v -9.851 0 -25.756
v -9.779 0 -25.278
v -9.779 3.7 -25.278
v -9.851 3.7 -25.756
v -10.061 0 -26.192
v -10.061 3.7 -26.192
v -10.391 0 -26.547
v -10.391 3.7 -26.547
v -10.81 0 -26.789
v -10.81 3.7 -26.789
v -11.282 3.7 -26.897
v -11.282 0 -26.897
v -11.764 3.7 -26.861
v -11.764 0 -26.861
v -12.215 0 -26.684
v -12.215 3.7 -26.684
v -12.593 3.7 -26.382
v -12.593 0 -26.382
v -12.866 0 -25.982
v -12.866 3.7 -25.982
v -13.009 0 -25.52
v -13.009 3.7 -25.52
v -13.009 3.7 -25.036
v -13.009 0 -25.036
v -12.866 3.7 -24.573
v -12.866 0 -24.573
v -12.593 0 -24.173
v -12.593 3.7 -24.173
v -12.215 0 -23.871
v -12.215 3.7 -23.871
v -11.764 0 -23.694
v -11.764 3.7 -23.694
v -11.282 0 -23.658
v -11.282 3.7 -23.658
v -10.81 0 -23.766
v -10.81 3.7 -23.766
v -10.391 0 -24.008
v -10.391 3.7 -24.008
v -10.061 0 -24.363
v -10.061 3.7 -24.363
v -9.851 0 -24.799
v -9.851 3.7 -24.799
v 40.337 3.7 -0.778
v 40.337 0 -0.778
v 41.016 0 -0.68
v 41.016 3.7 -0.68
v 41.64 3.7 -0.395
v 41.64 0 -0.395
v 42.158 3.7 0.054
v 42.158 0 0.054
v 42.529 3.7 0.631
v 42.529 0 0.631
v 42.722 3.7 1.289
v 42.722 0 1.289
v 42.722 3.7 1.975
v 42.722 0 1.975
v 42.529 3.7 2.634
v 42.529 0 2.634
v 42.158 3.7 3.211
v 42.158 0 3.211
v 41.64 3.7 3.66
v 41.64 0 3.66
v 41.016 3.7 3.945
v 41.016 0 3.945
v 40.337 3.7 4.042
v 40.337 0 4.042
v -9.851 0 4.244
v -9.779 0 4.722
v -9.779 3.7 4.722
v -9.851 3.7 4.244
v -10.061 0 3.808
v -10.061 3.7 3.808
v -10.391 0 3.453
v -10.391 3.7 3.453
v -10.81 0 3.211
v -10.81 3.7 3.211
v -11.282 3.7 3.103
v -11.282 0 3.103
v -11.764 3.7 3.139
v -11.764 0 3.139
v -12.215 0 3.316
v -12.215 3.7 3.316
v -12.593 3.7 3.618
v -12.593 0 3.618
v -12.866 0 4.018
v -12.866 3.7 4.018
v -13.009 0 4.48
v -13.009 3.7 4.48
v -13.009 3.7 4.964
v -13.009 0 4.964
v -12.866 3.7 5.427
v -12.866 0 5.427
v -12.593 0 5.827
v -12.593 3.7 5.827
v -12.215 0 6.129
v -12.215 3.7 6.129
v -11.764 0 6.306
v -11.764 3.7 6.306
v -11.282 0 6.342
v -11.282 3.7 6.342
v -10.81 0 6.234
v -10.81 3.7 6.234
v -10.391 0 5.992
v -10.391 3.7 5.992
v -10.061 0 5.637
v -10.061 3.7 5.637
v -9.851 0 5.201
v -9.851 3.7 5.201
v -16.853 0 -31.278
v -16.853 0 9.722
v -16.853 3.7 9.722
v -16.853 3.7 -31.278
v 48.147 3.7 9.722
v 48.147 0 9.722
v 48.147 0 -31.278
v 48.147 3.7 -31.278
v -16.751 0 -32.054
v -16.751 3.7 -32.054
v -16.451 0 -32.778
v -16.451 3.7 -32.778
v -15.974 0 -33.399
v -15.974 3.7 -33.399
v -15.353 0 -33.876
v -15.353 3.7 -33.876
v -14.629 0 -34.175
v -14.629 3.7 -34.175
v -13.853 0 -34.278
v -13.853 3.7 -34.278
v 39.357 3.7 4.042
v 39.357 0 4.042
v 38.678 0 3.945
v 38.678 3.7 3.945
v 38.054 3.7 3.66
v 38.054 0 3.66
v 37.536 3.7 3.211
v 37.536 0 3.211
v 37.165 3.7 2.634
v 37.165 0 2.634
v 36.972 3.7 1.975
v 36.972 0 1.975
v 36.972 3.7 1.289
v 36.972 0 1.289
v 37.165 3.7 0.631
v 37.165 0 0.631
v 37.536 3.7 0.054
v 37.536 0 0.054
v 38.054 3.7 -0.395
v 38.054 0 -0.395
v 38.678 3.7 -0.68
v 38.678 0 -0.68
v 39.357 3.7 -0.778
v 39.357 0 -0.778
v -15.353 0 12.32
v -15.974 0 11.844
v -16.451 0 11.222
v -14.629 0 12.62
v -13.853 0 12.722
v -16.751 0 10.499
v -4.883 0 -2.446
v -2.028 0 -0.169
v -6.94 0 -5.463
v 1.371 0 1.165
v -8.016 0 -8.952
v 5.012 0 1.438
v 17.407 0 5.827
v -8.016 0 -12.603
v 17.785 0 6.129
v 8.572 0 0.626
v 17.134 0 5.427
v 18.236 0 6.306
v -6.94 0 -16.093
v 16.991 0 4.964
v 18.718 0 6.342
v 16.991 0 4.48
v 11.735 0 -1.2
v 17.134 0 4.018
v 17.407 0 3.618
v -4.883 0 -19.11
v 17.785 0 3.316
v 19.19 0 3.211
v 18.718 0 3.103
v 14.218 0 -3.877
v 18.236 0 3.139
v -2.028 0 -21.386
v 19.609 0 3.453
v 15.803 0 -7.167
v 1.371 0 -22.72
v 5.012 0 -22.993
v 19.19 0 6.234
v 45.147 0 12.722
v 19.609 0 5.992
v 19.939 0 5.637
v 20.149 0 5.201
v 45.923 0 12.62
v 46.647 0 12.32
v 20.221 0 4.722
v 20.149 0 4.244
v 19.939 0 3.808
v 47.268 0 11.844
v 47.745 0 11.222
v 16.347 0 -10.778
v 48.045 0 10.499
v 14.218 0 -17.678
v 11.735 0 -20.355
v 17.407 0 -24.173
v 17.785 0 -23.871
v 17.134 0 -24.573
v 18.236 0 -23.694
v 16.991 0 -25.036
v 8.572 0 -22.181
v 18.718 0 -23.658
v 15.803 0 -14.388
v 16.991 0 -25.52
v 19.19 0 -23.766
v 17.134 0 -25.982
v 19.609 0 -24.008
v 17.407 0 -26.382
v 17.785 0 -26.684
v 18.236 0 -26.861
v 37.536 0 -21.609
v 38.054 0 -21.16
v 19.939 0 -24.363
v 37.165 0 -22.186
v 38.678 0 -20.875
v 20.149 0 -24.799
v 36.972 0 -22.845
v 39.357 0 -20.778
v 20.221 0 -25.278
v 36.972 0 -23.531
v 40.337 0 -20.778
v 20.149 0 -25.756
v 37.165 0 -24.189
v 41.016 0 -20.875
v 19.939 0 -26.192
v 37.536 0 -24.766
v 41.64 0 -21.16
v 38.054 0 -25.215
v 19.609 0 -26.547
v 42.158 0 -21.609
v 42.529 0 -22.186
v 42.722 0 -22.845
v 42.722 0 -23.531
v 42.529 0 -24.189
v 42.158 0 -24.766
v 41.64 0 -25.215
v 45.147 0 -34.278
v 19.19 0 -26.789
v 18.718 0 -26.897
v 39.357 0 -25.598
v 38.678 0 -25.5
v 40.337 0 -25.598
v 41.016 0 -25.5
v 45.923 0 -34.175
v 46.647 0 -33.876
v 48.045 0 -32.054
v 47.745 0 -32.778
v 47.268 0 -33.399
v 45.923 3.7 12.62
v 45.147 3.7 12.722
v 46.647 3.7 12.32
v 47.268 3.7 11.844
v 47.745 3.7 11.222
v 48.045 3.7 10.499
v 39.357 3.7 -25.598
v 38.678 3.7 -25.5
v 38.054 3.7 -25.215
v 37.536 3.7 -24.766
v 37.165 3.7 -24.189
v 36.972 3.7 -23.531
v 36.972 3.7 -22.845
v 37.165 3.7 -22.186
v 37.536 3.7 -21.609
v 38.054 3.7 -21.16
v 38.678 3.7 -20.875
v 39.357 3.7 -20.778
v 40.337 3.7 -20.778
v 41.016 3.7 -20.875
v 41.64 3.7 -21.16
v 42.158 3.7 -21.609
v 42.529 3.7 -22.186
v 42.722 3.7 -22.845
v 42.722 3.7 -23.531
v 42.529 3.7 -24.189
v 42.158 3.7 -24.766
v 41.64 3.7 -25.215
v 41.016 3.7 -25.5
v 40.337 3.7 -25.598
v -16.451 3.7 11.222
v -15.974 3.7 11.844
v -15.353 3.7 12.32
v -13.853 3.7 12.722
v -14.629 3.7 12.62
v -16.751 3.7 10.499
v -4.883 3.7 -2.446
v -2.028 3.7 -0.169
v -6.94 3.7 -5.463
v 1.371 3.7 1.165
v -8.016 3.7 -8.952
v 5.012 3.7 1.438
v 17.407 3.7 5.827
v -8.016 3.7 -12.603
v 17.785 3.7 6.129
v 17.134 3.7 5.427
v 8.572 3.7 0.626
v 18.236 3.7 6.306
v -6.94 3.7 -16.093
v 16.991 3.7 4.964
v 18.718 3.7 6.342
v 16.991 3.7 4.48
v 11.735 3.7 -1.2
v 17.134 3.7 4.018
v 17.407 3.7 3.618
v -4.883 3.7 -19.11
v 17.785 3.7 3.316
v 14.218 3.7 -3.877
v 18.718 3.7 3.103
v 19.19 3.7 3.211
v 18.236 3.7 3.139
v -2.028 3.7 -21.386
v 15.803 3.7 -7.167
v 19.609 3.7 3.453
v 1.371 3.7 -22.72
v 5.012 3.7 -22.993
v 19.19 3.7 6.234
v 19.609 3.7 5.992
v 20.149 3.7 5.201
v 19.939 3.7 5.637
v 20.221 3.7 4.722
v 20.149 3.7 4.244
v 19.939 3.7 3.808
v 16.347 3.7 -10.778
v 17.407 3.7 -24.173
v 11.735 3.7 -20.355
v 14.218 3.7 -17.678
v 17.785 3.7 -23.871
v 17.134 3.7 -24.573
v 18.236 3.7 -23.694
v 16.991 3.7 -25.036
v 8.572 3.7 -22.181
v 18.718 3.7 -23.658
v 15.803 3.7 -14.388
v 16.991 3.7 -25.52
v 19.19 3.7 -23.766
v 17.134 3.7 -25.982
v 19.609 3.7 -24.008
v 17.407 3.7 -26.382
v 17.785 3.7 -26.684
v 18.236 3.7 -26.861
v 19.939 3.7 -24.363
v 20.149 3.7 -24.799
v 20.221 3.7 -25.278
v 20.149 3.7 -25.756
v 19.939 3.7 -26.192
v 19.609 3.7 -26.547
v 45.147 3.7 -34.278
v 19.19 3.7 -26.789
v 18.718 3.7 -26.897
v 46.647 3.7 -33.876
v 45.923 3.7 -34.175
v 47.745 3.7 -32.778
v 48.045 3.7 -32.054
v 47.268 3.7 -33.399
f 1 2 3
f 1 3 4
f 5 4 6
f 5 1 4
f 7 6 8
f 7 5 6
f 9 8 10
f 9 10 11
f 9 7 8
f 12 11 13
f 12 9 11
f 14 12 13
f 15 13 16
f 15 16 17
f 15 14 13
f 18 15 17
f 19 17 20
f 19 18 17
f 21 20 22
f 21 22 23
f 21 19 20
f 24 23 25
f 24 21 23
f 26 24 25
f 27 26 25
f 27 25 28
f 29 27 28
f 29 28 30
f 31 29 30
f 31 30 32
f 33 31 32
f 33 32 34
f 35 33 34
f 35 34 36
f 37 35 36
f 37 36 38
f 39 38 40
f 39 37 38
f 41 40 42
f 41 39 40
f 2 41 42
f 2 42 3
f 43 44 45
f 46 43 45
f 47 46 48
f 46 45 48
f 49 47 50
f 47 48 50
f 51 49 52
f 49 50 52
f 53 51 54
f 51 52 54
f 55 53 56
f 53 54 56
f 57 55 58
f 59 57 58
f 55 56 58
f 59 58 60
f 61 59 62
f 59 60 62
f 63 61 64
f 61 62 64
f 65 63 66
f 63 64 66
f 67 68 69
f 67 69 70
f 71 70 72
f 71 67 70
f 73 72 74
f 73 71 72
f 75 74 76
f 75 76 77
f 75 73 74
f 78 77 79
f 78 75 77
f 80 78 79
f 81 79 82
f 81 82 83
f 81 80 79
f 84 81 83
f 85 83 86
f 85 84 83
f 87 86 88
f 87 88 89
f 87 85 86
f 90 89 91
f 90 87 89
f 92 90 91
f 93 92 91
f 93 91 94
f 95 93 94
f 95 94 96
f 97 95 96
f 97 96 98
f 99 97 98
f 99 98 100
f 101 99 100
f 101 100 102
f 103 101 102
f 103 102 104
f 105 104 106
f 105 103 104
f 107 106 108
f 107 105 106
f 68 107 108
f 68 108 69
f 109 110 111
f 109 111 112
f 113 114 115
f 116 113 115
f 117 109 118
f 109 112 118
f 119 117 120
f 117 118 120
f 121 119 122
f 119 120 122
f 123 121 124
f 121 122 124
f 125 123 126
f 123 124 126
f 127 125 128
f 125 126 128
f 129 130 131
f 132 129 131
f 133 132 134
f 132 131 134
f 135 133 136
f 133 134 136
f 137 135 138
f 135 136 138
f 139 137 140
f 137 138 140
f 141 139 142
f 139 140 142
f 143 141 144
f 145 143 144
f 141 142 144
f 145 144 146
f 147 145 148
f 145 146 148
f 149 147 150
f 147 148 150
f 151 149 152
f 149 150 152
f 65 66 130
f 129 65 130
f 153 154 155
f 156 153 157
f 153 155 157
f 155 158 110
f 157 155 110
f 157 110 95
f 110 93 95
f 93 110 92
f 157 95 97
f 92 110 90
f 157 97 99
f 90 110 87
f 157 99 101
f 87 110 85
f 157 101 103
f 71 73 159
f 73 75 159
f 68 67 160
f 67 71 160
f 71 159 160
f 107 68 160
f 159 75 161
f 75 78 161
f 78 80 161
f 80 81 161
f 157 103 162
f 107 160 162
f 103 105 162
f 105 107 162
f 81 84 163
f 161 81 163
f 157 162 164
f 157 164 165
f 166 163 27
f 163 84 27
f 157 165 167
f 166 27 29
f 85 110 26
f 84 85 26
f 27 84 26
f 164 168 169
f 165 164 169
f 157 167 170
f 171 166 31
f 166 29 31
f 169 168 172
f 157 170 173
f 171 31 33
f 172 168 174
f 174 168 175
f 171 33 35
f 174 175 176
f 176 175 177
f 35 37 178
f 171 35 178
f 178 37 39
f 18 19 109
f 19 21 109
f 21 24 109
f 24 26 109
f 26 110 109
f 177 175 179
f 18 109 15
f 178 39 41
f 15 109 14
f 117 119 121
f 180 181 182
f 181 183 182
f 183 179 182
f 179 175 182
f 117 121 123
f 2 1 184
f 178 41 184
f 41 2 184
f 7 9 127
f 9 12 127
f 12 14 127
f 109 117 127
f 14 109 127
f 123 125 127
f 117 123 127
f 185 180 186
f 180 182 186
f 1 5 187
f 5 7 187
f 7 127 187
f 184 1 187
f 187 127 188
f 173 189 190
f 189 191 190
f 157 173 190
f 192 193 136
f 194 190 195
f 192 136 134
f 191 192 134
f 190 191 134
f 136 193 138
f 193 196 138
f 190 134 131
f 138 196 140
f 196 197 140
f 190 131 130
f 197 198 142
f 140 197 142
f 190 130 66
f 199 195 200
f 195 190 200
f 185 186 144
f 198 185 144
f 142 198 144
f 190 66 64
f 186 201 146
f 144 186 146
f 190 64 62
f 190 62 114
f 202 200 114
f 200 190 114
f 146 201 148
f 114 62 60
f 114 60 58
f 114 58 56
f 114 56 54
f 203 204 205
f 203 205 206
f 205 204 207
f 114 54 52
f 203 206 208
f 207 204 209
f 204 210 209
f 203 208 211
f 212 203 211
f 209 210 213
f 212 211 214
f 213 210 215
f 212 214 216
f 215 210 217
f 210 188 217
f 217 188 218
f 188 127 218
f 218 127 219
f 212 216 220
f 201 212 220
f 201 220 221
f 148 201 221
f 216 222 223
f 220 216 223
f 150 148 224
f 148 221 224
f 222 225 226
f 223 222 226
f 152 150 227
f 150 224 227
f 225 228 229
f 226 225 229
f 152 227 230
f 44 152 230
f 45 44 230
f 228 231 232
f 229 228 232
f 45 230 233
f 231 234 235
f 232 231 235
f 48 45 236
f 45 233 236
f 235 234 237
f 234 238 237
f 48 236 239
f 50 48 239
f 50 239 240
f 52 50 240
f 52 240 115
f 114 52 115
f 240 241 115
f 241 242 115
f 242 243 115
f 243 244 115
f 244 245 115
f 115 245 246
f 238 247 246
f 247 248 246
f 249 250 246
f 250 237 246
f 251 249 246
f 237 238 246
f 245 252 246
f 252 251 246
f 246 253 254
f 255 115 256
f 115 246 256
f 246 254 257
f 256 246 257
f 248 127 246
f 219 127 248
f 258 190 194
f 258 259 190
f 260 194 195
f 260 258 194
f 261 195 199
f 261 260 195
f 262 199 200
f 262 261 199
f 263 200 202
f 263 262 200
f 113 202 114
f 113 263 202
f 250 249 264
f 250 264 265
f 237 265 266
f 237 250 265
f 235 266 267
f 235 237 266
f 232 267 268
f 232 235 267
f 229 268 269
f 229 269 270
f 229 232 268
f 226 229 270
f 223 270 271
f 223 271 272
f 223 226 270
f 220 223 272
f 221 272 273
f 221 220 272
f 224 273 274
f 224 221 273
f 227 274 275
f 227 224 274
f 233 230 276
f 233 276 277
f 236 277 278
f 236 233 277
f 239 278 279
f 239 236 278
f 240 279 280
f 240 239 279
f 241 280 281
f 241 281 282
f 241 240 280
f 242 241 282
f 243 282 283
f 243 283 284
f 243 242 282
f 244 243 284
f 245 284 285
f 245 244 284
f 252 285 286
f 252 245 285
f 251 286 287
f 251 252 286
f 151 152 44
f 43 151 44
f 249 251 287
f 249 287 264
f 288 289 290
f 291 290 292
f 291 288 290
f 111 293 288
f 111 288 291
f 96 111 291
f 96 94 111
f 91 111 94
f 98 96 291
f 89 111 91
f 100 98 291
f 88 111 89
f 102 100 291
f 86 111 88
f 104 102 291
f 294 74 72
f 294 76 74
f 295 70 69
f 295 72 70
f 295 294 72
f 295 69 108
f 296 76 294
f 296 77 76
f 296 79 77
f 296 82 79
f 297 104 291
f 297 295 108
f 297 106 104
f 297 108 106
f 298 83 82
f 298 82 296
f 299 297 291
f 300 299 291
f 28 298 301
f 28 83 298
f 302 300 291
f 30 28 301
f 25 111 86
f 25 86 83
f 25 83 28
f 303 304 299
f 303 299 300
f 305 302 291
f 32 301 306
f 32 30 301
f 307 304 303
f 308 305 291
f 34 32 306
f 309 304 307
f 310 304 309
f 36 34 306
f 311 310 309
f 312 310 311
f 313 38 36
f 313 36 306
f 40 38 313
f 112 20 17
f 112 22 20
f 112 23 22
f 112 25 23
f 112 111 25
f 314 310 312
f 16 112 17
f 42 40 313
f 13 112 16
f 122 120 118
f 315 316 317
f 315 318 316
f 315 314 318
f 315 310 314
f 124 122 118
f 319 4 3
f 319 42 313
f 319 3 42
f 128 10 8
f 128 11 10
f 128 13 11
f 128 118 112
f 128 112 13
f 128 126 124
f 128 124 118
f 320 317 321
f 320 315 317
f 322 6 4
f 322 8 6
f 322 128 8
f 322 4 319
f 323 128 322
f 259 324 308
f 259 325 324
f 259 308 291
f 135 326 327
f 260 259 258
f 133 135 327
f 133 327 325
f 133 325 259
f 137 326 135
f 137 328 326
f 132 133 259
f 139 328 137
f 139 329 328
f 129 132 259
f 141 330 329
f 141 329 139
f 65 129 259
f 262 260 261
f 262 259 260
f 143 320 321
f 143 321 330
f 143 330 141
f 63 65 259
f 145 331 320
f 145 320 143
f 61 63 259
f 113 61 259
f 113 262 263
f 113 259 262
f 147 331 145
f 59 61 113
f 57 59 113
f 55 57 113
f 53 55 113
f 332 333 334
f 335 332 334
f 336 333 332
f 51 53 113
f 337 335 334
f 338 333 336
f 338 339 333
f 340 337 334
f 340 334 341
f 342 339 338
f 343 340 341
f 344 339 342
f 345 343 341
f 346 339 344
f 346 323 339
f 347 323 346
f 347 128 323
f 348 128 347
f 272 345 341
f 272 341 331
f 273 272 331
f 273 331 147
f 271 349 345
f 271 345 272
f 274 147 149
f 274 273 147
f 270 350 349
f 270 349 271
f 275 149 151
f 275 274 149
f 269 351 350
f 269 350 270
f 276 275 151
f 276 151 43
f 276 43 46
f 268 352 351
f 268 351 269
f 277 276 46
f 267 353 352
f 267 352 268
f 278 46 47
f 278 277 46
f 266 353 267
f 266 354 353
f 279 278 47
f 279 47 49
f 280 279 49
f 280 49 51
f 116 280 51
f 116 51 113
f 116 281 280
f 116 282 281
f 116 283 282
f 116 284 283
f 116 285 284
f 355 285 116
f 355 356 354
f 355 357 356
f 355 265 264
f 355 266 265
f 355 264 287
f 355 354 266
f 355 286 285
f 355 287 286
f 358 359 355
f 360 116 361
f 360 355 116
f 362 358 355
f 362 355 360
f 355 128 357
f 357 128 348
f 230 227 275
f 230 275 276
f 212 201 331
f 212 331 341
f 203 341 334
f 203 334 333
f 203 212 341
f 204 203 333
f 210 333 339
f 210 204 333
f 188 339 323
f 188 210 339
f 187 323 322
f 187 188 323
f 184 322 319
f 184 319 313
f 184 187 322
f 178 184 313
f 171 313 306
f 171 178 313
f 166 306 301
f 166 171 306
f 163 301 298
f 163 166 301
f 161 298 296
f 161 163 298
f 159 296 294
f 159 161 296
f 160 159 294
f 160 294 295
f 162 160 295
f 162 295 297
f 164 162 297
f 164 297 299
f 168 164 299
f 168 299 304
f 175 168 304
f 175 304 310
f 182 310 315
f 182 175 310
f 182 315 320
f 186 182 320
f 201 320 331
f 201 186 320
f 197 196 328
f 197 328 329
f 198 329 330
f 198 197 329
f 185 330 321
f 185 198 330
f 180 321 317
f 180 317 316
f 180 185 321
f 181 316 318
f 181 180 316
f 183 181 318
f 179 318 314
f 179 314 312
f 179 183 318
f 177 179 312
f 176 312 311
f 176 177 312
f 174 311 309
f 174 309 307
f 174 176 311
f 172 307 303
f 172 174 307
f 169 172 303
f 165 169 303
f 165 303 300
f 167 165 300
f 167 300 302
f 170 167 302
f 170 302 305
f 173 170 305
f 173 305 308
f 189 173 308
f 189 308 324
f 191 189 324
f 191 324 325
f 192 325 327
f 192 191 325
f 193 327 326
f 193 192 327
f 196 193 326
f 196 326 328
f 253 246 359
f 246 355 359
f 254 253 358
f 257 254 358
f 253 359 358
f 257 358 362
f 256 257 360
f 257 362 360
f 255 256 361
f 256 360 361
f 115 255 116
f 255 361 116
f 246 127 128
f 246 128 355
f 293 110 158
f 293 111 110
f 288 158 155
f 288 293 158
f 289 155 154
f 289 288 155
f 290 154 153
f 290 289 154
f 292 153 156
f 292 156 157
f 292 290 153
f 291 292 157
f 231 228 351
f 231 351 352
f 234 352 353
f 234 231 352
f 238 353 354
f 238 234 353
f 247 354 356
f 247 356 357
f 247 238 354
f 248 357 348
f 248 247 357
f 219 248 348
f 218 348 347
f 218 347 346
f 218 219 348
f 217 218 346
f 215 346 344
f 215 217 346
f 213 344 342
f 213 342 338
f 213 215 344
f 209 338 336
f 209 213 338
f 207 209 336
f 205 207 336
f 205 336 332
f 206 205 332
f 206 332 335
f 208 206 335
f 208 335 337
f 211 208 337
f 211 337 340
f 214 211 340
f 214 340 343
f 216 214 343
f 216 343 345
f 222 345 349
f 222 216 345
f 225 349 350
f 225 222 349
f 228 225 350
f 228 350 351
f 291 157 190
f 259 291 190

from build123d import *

# Parameters (mm, degrees)
SKETCH1_W           = 65
SKETCH1_H           = 47
SKETCH1_R           = 12.25
SKETCH1_R_2         = 1.623849847
BOSS_EXTRUDE1_DEPTH = 3.7
FILLET1_R           = 3


with BuildPart() as part:
    # Sketch1 → Boss-Extrude1 (new body)
    with BuildSketch(Plane(origin=(0, 0, 0), x_dir=(1, 0, 0), z_dir=(0, 1, 0))):
        with Locations((15.646990036, 10.777629745)):
            Rectangle(SKETCH1_W, SKETCH1_H)
        with Locations((4.096990036, 10.777629745)):
            Circle(SKETCH1_R, mode=Mode.SUBTRACT)
        with Locations((-11.403009964, -4.722370255)):
            Circle(SKETCH1_R_2, mode=Mode.SUBTRACT)
        with Locations((18.596990036, -4.722370255)):
            Circle(SKETCH1_R_2, mode=Mode.SUBTRACT)
        with Locations((18.596990036, 25.277629745)):
            Circle(SKETCH1_R_2, mode=Mode.SUBTRACT)
        with Locations((-11.403009964, 25.277629745)):
            Circle(SKETCH1_R_2, mode=Mode.SUBTRACT)
        with BuildLine():
            Line((39.356990036, 0.777629745), (40.336990036, 0.777629745))
            ThreePointArc((40.336990036, 0.777629745), (42.746990036, -1.632370255), (40.336990036, -4.042370255))
            Line((40.336990036, -4.042370255), (39.356990036, -4.042370255))
            ThreePointArc((39.356990036, -4.042370255), (36.946990036, -1.632370255), (39.356990036, 0.777629745))
        make_face(mode=Mode.SUBTRACT)
        with BuildLine():
            Line((39.356990036, 20.777629745), (40.336990036, 20.777629745))
            ThreePointArc((40.336990036, 20.777629745), (42.746990036, 23.187629745), (40.336990036, 25.597629745))
            Line((40.336990036, 25.597629745), (39.356990036, 25.597629745))
            ThreePointArc((39.356990036, 25.597629745), (36.946990036, 23.187629745), (39.356990036, 20.777629745))
        make_face(mode=Mode.SUBTRACT)
    extrude(amount=BOSS_EXTRUDE1_DEPTH)

    # Fillet1
    fillet1_edges = [part.edges().sort_by_distance(p)[0] for p in [
        (-16.853009964, 1.85, -34.277629745),
        (48.146990036, 1.85, -34.277629745),
        (48.146990036, 1.85, 12.722370255),
        (-16.853009964, 1.85, 12.722370255),
    ]]
    fillet(fillet1_edges, radius=FILLET1_R)


solid = part.part
